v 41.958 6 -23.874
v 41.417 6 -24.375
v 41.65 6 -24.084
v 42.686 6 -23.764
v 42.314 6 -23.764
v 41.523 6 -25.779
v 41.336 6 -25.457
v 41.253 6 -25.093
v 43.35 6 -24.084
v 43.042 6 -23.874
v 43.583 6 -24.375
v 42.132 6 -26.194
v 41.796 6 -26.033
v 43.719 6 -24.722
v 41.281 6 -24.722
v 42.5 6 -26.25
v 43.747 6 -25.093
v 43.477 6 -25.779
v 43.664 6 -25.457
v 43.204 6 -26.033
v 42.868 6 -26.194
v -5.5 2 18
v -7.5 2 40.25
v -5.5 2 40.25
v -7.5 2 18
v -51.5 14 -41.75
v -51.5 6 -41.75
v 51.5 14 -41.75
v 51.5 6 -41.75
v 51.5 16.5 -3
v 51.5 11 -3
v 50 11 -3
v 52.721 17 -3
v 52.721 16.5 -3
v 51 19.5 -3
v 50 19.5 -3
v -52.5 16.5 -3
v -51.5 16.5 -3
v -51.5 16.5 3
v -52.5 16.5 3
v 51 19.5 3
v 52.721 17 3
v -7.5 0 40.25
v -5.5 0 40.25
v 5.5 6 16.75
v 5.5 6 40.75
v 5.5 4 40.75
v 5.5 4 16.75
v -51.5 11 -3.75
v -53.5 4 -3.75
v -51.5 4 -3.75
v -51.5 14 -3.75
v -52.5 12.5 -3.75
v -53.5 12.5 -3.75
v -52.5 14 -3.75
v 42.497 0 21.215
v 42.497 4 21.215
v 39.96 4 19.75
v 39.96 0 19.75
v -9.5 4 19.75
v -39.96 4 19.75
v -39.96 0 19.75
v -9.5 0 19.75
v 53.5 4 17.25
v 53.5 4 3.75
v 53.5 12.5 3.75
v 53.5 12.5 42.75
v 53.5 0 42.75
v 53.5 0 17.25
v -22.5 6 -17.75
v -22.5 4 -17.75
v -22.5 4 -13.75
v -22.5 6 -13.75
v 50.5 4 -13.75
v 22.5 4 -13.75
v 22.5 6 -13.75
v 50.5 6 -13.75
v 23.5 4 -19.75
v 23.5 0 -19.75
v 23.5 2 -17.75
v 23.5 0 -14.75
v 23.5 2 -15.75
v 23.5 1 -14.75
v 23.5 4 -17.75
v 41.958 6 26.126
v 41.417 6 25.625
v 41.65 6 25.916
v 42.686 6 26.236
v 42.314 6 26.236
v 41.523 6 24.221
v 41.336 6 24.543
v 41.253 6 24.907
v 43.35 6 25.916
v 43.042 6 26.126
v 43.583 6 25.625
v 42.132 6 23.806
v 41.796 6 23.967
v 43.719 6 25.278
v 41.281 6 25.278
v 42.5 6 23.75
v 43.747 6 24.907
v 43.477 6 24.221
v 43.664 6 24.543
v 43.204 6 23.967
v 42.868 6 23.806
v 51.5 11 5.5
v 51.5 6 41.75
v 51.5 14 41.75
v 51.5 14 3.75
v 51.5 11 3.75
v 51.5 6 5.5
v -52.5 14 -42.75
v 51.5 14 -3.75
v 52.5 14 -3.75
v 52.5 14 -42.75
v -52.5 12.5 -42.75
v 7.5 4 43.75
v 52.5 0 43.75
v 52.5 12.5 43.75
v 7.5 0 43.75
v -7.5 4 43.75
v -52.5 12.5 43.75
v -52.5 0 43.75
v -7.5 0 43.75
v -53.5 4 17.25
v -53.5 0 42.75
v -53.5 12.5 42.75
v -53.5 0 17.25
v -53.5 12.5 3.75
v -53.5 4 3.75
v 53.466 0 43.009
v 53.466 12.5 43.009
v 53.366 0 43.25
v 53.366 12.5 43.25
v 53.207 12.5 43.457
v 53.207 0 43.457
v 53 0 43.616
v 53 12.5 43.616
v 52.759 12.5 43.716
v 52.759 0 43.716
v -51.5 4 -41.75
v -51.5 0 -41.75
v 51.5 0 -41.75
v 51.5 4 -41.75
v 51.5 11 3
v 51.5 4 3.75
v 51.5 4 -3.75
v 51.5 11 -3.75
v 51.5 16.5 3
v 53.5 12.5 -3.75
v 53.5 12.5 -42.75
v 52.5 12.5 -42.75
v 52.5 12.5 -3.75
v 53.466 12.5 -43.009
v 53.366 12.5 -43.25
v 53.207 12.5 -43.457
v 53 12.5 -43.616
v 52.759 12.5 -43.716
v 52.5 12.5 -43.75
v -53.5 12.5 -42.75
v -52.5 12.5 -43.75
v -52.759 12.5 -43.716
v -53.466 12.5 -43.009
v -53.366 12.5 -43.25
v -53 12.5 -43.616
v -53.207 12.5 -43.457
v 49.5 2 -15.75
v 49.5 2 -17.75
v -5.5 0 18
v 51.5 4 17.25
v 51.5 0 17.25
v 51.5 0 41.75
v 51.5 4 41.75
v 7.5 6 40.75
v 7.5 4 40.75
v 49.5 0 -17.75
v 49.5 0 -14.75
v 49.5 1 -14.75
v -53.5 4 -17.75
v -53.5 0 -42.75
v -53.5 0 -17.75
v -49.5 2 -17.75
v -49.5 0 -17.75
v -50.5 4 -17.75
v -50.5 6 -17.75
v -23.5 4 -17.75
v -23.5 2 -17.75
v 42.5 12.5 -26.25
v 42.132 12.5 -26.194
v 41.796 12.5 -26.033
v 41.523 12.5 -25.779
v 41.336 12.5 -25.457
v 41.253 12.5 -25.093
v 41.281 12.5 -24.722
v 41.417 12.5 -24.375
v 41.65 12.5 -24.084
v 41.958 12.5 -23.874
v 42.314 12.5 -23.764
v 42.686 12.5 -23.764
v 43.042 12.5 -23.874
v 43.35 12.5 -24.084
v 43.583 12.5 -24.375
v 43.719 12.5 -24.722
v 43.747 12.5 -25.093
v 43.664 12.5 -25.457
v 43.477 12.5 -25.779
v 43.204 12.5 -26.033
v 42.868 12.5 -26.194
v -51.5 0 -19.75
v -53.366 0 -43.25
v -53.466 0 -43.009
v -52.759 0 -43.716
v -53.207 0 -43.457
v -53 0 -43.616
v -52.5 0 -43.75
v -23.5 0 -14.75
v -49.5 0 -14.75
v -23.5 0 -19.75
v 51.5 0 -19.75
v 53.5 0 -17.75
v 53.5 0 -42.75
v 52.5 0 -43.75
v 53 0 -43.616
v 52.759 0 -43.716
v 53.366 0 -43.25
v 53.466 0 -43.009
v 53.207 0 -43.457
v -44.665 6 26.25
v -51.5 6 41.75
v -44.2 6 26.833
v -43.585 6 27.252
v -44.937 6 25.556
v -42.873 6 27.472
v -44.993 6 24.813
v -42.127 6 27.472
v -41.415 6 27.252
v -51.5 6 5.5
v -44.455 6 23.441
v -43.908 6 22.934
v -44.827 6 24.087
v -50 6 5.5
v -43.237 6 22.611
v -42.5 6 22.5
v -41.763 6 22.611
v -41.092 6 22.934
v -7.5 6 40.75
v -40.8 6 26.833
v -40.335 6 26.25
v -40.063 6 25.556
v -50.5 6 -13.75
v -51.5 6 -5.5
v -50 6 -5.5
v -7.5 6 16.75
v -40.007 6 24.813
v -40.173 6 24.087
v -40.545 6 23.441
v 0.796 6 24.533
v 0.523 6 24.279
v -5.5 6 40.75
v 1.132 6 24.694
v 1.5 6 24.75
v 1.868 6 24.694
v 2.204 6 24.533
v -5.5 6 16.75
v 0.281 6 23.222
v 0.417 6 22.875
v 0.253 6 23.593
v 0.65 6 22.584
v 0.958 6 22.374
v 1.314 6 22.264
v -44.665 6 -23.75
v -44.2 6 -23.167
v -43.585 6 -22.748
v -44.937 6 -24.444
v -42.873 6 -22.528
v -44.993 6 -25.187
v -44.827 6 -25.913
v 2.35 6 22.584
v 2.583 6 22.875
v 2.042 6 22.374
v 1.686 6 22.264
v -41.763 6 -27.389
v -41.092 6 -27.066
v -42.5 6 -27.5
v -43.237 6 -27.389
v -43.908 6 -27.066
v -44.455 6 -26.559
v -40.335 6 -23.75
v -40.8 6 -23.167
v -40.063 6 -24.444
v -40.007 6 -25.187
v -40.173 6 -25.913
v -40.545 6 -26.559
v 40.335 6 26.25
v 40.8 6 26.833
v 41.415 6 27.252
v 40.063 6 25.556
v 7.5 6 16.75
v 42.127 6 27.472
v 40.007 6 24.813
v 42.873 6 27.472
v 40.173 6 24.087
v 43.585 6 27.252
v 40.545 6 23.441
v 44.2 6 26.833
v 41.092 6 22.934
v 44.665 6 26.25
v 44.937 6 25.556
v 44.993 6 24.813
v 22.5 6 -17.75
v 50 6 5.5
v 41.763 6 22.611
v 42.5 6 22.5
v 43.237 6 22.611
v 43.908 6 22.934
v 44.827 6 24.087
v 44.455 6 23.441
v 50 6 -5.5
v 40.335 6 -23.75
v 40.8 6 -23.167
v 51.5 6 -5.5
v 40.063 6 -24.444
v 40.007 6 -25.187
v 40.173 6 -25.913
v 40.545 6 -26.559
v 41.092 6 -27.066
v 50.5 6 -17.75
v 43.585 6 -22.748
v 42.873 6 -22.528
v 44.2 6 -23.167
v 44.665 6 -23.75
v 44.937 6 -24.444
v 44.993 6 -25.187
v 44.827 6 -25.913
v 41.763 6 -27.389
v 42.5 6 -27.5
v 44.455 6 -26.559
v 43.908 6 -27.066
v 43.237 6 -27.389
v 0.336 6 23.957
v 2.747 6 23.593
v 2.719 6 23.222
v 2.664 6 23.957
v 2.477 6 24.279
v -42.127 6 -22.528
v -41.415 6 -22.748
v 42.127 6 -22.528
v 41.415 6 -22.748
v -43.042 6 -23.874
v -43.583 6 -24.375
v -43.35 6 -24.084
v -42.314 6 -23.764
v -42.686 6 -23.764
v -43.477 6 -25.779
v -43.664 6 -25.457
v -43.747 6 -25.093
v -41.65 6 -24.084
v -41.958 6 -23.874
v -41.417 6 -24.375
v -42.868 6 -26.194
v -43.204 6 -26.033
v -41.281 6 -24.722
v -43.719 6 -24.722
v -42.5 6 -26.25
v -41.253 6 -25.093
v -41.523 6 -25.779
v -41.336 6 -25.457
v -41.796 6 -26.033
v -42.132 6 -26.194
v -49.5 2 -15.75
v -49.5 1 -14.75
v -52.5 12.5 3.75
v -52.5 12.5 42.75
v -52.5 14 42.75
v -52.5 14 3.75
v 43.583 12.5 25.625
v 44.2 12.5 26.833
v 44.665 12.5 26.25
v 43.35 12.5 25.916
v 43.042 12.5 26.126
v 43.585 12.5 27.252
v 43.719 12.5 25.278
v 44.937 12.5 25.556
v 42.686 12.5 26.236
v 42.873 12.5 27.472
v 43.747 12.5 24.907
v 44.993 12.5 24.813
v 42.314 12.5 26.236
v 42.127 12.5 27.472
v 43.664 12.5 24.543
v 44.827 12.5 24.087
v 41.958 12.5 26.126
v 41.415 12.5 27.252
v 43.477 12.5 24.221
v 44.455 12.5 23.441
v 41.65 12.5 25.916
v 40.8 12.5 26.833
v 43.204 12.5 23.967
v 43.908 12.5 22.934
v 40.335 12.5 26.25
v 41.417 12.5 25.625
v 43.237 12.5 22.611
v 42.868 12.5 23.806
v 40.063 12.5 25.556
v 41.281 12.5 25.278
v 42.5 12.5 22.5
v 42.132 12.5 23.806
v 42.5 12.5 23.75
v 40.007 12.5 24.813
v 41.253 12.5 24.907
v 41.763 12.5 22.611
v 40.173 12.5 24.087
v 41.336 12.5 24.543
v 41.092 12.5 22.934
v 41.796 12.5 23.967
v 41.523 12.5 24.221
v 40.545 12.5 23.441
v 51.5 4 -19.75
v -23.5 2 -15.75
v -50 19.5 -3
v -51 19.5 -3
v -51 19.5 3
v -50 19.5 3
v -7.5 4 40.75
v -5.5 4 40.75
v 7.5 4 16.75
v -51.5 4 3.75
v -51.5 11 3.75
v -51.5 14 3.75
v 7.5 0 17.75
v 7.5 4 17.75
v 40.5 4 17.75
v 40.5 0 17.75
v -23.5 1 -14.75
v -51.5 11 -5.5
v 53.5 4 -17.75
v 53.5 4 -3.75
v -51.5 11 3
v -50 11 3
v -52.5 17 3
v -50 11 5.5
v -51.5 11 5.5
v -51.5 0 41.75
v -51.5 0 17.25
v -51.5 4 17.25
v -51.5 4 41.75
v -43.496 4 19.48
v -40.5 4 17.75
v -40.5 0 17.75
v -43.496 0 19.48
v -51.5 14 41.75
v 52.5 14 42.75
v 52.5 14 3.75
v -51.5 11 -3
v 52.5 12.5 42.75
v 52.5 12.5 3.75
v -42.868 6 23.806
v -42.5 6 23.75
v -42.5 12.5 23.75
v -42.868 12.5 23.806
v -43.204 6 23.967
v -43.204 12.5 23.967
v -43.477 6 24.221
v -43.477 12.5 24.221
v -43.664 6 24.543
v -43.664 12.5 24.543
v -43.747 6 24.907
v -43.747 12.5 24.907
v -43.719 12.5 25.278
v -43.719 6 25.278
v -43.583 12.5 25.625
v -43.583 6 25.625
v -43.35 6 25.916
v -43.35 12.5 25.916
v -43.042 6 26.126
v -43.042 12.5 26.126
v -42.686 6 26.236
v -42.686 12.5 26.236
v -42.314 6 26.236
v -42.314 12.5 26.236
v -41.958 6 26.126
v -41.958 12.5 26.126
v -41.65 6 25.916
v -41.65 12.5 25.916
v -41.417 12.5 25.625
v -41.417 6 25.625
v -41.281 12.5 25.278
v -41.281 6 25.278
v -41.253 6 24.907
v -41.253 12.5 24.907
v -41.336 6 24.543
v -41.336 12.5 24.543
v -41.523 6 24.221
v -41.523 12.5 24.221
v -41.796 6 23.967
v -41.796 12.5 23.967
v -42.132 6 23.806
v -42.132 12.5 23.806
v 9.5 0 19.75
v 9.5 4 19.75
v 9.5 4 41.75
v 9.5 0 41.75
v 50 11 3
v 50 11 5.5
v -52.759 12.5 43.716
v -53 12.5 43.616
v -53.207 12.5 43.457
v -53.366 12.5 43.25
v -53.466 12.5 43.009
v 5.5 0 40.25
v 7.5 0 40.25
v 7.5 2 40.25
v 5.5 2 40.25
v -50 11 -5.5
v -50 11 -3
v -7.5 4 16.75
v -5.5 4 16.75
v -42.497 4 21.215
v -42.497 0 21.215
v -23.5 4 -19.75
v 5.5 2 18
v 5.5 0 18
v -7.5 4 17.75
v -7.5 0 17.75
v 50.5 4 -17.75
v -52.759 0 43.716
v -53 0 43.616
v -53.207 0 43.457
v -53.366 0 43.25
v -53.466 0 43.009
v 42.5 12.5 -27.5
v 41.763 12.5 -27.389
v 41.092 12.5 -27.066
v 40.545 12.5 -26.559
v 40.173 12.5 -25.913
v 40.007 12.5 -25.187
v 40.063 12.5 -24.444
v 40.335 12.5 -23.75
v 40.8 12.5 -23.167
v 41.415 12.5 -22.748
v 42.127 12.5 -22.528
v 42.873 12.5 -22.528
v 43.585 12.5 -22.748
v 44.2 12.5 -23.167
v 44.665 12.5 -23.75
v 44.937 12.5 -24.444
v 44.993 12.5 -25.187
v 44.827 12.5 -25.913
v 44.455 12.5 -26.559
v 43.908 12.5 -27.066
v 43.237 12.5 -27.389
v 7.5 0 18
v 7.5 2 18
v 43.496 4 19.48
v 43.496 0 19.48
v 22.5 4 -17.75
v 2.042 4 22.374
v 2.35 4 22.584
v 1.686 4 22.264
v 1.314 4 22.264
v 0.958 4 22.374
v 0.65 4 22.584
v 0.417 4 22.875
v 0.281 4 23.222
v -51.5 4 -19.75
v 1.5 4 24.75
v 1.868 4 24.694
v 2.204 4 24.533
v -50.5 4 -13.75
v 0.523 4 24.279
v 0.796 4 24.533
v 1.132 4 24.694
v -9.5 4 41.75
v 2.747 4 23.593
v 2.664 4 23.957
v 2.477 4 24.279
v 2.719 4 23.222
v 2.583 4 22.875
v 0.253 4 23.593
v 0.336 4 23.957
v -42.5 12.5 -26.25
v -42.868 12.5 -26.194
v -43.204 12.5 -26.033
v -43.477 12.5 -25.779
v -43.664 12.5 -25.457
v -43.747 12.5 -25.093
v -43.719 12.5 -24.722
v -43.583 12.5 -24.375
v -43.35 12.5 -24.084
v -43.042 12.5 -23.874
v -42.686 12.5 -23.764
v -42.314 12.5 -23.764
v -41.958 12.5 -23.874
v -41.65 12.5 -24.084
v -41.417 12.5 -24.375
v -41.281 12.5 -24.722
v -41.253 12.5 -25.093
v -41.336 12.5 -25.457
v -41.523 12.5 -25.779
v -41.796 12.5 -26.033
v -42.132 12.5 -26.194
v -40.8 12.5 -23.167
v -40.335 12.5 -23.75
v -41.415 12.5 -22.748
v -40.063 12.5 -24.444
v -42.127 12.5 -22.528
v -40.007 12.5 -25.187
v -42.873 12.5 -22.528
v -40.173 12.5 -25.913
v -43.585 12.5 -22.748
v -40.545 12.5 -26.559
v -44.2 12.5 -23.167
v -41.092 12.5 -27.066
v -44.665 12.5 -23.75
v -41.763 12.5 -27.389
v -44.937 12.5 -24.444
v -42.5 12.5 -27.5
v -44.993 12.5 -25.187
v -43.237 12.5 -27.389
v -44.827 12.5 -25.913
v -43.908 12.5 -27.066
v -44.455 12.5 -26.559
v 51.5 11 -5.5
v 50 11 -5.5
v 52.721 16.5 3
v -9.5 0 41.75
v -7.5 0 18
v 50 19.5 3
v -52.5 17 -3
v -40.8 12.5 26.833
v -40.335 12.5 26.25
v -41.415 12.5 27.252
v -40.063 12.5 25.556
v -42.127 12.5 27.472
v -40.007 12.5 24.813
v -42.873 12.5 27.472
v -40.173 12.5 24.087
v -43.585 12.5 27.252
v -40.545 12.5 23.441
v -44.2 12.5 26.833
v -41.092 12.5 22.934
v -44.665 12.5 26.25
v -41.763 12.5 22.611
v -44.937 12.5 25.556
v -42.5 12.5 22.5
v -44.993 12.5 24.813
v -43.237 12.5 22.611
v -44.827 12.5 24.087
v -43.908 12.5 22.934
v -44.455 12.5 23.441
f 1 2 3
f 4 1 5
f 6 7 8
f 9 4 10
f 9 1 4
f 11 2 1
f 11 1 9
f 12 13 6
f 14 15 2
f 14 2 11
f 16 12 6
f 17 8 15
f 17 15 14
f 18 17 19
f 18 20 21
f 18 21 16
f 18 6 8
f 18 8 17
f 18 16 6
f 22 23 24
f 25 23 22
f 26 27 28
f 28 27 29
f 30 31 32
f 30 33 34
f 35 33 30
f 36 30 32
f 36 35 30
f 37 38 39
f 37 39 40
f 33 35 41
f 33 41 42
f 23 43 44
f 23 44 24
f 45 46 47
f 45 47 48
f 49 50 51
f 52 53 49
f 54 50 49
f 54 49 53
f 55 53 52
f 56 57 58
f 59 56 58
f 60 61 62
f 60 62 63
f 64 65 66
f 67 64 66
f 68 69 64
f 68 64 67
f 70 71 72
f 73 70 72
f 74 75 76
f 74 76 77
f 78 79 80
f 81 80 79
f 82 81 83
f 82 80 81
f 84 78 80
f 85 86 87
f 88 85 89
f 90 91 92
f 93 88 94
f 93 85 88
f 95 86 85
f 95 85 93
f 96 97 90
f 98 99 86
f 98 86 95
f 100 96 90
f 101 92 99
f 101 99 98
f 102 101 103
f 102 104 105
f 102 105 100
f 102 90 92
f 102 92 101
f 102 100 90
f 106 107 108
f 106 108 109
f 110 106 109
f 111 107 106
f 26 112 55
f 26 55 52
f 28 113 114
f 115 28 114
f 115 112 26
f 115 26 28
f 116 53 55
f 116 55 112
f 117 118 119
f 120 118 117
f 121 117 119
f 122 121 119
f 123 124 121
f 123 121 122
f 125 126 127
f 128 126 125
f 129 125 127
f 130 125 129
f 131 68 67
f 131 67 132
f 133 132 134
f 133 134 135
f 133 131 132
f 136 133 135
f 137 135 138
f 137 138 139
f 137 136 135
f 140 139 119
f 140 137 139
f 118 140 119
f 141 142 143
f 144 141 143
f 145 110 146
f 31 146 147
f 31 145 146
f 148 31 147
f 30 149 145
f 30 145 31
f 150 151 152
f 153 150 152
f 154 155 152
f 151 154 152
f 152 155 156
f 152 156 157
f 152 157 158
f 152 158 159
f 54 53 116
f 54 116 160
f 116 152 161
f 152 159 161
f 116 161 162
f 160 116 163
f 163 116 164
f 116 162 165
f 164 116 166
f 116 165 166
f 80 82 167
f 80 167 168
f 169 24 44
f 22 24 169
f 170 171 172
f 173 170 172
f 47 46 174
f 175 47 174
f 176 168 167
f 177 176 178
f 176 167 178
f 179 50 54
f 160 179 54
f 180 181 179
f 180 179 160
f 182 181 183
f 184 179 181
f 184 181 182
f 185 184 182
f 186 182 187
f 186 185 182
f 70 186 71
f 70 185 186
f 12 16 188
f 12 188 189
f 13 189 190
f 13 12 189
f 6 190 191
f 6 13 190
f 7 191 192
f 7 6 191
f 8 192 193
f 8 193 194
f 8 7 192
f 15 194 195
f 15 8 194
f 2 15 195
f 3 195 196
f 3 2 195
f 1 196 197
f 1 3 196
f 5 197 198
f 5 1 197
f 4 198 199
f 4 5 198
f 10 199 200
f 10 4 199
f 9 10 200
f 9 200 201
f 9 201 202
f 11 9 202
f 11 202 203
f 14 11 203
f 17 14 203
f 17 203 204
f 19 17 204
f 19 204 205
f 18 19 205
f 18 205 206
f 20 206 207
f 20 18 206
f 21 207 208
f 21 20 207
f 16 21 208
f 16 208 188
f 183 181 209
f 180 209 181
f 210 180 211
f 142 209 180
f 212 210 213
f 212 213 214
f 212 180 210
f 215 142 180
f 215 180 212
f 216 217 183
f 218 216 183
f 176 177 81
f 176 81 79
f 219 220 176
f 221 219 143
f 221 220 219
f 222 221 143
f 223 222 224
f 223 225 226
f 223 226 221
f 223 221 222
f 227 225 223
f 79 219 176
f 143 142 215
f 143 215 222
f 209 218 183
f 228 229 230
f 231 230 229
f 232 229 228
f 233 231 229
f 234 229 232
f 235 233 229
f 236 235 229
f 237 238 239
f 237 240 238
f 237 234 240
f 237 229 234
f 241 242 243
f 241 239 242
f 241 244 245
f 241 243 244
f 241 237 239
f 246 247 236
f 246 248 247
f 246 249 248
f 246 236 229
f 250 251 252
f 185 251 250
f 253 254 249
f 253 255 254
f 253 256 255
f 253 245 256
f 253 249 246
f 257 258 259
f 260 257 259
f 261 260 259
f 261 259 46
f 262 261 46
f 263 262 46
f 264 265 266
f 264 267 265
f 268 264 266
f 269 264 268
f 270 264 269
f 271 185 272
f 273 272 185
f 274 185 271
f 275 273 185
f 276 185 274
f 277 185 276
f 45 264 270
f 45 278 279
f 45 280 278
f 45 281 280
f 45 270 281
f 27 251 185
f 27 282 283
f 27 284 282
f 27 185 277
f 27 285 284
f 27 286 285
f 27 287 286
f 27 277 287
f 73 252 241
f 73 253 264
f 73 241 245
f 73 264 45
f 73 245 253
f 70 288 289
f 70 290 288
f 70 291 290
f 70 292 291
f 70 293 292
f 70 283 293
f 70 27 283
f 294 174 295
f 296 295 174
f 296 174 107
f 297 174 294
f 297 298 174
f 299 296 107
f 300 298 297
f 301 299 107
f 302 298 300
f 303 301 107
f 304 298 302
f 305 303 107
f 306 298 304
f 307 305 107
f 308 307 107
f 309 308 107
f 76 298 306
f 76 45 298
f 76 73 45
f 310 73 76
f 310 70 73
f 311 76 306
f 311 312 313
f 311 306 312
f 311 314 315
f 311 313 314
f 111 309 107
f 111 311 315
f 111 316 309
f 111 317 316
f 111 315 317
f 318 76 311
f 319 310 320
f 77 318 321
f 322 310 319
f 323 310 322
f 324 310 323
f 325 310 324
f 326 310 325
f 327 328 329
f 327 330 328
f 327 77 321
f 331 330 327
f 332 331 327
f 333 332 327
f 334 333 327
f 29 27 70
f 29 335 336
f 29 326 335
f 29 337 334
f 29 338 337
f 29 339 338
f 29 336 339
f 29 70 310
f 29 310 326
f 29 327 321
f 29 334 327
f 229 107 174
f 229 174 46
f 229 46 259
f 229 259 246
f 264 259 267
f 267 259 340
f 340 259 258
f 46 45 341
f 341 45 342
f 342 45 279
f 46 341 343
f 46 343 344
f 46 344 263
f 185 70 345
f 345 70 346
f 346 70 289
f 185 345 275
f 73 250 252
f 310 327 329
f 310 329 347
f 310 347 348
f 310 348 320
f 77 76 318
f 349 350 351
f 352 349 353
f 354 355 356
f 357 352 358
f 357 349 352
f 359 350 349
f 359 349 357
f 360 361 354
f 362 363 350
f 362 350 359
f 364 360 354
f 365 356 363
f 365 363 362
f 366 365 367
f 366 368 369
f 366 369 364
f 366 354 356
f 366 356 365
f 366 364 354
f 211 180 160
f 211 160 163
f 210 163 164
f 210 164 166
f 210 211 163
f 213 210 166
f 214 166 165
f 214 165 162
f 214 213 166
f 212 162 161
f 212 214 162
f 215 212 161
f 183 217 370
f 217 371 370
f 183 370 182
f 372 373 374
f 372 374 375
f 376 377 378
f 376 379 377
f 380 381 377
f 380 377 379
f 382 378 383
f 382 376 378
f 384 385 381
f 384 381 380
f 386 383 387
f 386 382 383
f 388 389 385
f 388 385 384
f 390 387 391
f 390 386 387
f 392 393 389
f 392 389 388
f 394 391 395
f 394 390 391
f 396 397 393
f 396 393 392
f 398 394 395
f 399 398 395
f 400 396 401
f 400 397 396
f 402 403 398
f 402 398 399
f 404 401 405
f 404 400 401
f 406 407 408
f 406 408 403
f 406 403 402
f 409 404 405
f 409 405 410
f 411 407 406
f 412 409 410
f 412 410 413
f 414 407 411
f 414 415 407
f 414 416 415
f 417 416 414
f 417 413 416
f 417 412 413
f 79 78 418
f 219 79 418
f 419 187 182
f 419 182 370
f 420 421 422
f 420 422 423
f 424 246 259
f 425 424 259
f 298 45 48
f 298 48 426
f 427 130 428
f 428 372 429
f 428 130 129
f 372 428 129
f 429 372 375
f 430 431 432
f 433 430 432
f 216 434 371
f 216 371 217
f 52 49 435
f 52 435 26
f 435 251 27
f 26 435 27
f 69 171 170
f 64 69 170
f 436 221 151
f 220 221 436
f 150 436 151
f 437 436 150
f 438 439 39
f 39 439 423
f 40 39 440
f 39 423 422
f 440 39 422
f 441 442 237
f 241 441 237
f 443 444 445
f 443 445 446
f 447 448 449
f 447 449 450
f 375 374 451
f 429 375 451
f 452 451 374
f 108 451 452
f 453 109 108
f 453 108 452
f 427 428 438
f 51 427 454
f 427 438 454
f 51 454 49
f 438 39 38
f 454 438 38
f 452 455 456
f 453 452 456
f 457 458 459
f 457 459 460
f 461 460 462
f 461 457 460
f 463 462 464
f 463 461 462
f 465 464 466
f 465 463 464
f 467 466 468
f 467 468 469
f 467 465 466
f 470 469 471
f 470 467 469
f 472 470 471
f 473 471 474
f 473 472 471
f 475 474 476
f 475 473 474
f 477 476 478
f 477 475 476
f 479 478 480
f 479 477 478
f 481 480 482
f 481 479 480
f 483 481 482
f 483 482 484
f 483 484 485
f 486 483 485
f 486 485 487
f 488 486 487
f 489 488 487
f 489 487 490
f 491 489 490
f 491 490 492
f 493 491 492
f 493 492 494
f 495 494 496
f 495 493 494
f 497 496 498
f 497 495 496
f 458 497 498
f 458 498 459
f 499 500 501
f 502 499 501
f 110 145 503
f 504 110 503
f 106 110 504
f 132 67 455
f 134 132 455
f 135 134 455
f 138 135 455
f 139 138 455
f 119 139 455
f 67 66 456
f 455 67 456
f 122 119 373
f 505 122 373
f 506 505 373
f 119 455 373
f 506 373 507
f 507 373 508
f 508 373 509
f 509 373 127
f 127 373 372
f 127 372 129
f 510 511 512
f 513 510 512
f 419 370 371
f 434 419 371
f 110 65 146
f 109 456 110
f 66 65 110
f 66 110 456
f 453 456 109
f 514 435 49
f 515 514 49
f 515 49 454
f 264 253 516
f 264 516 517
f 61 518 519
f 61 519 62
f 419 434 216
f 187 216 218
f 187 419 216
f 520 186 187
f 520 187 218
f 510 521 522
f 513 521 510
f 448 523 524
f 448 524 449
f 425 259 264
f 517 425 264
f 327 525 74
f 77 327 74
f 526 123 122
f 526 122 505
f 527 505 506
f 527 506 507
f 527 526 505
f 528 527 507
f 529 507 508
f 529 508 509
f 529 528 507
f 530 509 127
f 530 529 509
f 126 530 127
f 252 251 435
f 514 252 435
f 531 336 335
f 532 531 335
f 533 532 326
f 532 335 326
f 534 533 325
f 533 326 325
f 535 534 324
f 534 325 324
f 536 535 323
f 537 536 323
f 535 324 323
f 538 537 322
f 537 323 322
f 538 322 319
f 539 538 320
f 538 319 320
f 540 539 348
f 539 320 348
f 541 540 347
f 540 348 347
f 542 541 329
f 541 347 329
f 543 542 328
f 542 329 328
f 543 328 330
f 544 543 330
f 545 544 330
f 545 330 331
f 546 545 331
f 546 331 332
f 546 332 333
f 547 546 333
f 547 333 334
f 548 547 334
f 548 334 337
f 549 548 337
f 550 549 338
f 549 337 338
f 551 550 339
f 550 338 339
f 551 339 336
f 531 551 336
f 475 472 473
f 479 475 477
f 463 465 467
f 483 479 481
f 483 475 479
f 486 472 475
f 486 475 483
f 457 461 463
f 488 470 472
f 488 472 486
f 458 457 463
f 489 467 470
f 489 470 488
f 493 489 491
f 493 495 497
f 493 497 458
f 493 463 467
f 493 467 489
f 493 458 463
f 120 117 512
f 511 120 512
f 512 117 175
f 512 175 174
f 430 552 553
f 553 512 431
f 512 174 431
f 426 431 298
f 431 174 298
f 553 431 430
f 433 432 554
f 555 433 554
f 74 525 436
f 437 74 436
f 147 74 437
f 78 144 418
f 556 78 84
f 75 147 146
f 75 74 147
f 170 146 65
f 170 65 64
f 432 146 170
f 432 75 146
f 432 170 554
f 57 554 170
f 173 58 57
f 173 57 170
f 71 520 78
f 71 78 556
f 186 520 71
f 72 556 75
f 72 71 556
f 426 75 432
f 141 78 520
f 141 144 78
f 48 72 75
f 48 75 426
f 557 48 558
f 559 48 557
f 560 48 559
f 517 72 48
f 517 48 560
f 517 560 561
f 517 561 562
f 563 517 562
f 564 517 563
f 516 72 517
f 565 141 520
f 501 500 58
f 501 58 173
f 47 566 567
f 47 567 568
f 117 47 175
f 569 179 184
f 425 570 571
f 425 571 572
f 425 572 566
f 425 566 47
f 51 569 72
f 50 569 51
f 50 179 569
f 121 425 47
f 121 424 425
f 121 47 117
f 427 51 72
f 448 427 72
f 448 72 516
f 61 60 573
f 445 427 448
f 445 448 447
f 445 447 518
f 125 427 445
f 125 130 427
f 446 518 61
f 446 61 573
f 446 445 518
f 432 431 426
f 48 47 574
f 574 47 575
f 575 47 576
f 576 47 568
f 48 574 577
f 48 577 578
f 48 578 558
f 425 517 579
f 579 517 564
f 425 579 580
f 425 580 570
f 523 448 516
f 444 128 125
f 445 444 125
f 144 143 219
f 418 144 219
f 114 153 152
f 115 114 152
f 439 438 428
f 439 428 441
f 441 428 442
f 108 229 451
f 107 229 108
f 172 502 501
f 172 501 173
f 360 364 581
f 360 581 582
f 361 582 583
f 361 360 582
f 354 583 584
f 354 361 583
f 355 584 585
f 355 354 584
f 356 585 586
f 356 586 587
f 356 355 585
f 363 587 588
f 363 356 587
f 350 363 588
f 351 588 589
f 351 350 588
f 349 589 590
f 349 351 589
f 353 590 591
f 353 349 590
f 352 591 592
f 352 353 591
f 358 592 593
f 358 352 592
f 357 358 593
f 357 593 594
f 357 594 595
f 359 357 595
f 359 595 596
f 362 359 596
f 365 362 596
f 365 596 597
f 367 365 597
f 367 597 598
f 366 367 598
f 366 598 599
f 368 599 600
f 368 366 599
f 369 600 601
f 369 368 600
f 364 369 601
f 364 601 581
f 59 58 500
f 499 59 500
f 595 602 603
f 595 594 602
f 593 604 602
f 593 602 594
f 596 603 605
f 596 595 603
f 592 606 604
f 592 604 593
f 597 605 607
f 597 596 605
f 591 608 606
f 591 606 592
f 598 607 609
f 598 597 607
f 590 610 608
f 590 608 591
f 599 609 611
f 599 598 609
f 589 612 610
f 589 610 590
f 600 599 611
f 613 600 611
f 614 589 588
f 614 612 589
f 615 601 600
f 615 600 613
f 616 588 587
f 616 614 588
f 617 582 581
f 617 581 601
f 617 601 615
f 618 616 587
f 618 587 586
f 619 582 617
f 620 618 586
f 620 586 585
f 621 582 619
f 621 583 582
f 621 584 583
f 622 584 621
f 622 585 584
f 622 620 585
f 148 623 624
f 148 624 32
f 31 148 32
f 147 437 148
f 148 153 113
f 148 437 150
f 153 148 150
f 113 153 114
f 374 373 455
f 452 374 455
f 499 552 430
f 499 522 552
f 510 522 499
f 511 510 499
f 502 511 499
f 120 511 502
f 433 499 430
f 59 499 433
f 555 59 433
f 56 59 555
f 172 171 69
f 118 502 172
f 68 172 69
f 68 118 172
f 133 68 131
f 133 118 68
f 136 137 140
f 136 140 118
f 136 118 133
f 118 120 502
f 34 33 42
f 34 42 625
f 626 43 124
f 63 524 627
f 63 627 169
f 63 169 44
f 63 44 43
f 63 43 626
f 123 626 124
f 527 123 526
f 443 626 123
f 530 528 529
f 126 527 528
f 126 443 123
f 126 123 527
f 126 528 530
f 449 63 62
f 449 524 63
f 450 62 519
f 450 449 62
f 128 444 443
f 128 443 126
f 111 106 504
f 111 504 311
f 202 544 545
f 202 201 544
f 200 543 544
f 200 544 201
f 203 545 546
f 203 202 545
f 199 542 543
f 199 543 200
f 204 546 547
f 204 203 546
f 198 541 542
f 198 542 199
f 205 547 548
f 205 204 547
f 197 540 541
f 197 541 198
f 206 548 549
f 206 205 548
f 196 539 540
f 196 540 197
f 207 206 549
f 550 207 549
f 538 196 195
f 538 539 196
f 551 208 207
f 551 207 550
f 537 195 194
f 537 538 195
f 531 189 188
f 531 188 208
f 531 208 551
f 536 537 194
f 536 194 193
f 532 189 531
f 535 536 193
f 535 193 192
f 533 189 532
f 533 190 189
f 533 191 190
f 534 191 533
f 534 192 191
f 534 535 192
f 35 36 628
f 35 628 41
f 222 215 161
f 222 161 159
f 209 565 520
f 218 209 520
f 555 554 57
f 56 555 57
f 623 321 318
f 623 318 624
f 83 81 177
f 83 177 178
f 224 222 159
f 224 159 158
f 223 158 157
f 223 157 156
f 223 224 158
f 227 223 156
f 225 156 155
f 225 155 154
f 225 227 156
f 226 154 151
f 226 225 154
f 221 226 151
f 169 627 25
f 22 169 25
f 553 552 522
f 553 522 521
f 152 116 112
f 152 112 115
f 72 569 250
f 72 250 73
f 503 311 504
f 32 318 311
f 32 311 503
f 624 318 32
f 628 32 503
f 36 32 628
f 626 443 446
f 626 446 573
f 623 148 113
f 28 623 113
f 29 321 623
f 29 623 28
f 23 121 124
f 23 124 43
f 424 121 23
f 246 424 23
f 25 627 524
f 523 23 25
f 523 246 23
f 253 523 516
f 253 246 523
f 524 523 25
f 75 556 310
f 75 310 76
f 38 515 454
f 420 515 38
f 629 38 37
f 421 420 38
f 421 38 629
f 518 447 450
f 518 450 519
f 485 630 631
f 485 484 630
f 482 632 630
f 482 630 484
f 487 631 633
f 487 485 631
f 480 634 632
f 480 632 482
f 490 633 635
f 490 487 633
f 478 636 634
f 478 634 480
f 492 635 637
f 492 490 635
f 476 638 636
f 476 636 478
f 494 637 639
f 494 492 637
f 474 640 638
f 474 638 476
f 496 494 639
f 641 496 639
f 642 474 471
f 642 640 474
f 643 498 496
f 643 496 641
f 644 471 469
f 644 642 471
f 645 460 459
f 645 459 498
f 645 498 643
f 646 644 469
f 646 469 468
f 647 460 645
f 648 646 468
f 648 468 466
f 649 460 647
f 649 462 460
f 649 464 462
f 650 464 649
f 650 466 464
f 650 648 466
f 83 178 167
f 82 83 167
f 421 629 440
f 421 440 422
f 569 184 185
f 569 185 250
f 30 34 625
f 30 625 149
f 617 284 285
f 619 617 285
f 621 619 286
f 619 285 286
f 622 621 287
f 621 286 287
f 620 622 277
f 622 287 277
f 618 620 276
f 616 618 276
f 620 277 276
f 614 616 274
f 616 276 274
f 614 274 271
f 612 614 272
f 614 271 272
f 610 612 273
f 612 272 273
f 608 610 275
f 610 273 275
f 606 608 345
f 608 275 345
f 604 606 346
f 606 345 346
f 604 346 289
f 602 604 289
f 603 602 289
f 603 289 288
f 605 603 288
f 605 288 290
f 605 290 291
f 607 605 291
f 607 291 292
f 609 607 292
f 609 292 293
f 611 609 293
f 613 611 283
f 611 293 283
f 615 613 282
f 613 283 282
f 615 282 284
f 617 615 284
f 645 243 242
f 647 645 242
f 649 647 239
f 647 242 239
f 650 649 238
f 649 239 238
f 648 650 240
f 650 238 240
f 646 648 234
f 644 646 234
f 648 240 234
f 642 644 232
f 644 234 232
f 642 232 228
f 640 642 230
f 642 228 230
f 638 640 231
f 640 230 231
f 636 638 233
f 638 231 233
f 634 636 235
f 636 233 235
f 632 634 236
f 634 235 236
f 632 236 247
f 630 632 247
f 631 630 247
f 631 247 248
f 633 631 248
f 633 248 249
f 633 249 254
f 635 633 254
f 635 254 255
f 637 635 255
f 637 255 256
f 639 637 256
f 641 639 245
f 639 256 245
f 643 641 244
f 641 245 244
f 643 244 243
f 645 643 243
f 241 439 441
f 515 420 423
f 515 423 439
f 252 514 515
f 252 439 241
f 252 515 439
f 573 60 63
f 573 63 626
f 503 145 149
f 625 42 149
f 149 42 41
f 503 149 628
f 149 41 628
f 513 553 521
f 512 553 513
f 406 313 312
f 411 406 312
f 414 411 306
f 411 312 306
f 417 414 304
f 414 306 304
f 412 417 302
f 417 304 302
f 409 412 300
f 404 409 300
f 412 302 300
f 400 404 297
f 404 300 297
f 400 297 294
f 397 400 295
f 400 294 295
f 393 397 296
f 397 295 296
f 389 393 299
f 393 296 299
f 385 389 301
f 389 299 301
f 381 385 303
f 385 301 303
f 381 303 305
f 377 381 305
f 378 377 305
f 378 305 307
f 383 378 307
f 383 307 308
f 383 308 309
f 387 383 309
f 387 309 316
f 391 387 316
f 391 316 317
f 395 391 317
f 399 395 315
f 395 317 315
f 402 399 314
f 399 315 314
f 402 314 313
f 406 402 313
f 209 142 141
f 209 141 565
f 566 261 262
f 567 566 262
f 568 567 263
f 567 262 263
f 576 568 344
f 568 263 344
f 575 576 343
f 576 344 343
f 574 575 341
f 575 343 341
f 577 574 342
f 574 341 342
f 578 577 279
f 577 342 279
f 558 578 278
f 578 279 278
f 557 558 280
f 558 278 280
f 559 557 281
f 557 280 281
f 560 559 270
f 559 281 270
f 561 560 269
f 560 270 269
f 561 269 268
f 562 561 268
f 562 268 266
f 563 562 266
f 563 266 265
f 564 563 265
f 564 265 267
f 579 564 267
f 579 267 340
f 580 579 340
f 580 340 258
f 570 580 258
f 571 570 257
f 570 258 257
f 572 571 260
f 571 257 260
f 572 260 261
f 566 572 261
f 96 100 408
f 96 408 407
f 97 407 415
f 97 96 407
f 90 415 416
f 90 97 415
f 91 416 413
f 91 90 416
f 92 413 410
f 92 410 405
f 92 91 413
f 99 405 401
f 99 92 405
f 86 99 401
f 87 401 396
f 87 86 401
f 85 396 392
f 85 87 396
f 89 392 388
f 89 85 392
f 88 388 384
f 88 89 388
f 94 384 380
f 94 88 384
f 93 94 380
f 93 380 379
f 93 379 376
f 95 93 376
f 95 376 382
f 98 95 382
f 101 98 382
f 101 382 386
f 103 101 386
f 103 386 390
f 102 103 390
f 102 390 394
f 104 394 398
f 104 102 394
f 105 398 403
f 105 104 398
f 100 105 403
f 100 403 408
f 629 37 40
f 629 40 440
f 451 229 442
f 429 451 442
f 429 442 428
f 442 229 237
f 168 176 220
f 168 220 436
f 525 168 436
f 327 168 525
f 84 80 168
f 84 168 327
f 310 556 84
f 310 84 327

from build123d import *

# Parameters (mm, degrees)
BOSS_EXTRUDE1_DEPTH  = 12.5
SKETCH2_W            = 103
SKETCH2_H            = 83.5
CUT_EXTRUDE1_DEPTH   = 4
SKETCH3_W            = 103
SKETCH3_H            = 83.5
CUT_EXTRUDE2_DEPTH   = 6.5
SKETCH4_W            = 105
SKETCH4_H            = 85.5
SKETCH4_W_2          = 103
SKETCH4_H_2          = 83.5
BOSS_EXTRUDE2_DEPTH  = 1.5
SKETCH7_W            = 35
SKETCH7_H            = 4
CUT_EXTRUDE3_DEPTH   = 117.443387532
SKETCH8_W            = 7.5
SKETCH8_H            = 10
CUT_EXTRUDE4_DEPTH   = 2
SKETCH9_W            = 7.5
SKETCH9_H            = 10
CUT_EXTRUDE5_DEPTH   = 2
BOSS_EXTRUDE3_DEPTH  = 1.5
BOSS_EXTRUDE4_DEPTH  = 1.5
BOSS_EXTRUDE5_DEPTH  = 6
BOSS_EXTRUDE6_DEPTH  = 6
SKETCH14_W           = 28
SKETCH14_H           = 4
CUT_EXTRUDE6_DEPTH   = 2
SKETCH15_W           = 15
SKETCH15_H           = 3.5
CUT_EXTRUDE7_DEPTH   = 4
SKETCH16_R           = 1.25
SKETCH16_W           = 2
SKETCH16_H           = 24
CUT_EXTRUDE8_DEPTH   = 2
SKETCH17_R           = 2.5
SKETCH17_R_2         = 1.25
BOSS_EXTRUDE7_DEPTH  = 6.5
SKETCH18_W           = 28
SKETCH18_H           = 2
BOSS_EXTRUDE8_DEPTH  = 4
BOSS_EXTRUDE9_DEPTH  = 26
BOSS_EXTRUDE10_DEPTH = 26
BOSS_EXTRUDE11_DEPTH = 4
SKETCH22_W           = 22.25
SKETCH22_H           = 2
BOSS_EXTRUDE12_DEPTH = 2
SKETCH23_W           = 22.25
SKETCH23_H           = 2
BOSS_EXTRUDE13_DEPTH = 2


with BuildPart() as part:
    # Sketch1 → Boss-Extrude1 (new body)
    with BuildSketch(Plane(origin=(0, 0, 0), x_dir=(1, 0, 0), z_dir=(0, 1, 0))):
        with BuildLine():
            Line((52.5, -43.75), (-52.5, -43.75))
            ThreePointArc((-52.5, -43.75), (-53.207106781, -43.457106781), (-53.5, -42.75))
            Line((-53.5, -42.75), (-53.5, 42.75))
            ThreePointArc((-53.5, 42.75), (-53.207106781, 43.457106781), (-52.5, 43.75))
            Line((-52.5, 43.75), (52.5, 43.75))
            ThreePointArc((52.5, 43.75), (53.207106781, 43.457106781), (53.5, 42.75))
            Line((53.5, 42.75), (53.5, -42.75))
            ThreePointArc((53.5, -42.75), (53.207106781, -43.457106781), (52.5, -43.75))
        make_face()
    extrude(amount=BOSS_EXTRUDE1_DEPTH)

    # Sketch2 → Cut-Extrude1 (cut)
    with BuildSketch(Plane.XZ):
        Rectangle(SKETCH2_W, SKETCH2_H)
    extrude(amount=-CUT_EXTRUDE1_DEPTH, mode=Mode.SUBTRACT)

    # Sketch3 → Cut-Extrude2 (cut)
    with BuildSketch(Plane(origin=(0, 12.5, 0), x_dir=(1, 0, 0), z_dir=(0, 1, 0))):
        Rectangle(SKETCH3_W, SKETCH3_H)
    extrude(amount=-CUT_EXTRUDE2_DEPTH, mode=Mode.SUBTRACT)

    # Sketch4 → Boss-Extrude2 (add)
    with BuildSketch(Plane(origin=(0, 12.5, 0), x_dir=(1, 0, 0), z_dir=(0, 1, 0))):
        Rectangle(SKETCH4_W, SKETCH4_H)
        Rectangle(SKETCH4_W_2, SKETCH4_H_2, mode=Mode.SUBTRACT)
    extrude(amount=BOSS_EXTRUDE2_DEPTH)

    # Sketch7 → Cut-Extrude3 (cut, through all)
    with BuildSketch(Plane.ZY.offset(53.5)):
        with Locations((-0.25, 2)):
            Rectangle(SKETCH7_W, SKETCH7_H)
    extrude(amount=-CUT_EXTRUDE3_DEPTH, mode=Mode.SUBTRACT)

    # Sketch8 → Cut-Extrude4 (cut)
    with BuildSketch(Plane.ZY.offset(53.5)):
        with Locations((0, 9)):
            Rectangle(SKETCH8_W, SKETCH8_H)
    extrude(amount=-CUT_EXTRUDE4_DEPTH, mode=Mode.SUBTRACT)

    # Sketch9 → Cut-Extrude5 (cut)
    with BuildSketch(Plane(origin=(53.5, 0, 0), x_dir=(0, 0, -1), z_dir=(1, 0, 0))):
        with Locations((0, 9)):
            Rectangle(SKETCH9_W, SKETCH9_H)
    extrude(amount=-CUT_EXTRUDE5_DEPTH, mode=Mode.SUBTRACT)

    # Sketch10 → Boss-Extrude3 (add)
    with BuildSketch(Plane.ZY.offset(-51.5)):
        Polygon((5.5, 6), (-5.5, 6), (-5.5, 11), (-3, 11), (-3, 16.5), (3, 16.5), (3, 11), (5.5, 11), align=None)
    extrude(amount=BOSS_EXTRUDE3_DEPTH)

    # Sketch11 → Boss-Extrude4 (add)
    with BuildSketch(Plane(origin=(-51.5, 0, 0), x_dir=(0, 0, -1), z_dir=(1, 0, 0))):
        Polygon((-5.5, 11), (-5.5, 6), (5.5, 6), (5.5, 11), (3, 11), (3, 16.5), (-3, 16.5), (-3, 11), align=None)
    extrude(amount=BOSS_EXTRUDE4_DEPTH)

    # Sketch12 → Boss-Extrude5 (add)
    with BuildSketch(Plane(origin=(0, 0, -3), x_dir=(-1, 0, 0), z_dir=(0, 0, -1))):
        Polygon((-52.720588235, 16.5), (-50, 16.5), (-50, 19.5), (-51, 19.5), (-52.720588235, 17), align=None)
    extrude(amount=-BOSS_EXTRUDE5_DEPTH)

    # Sketch13 → Boss-Extrude6 (add)
    with BuildSketch(Plane(origin=(0, 0, -3), x_dir=(-1, 0, 0), z_dir=(0, 0, -1))):
        Polygon((50, 16.5), (52.5, 16.5), (52.5, 17), (51, 19.5), (50, 19.5), align=None)
    extrude(amount=-BOSS_EXTRUDE6_DEPTH)

    # Sketch14 → Cut-Extrude6 (cut)
    with BuildSketch(Plane.XZ.offset(-4)):
        with Locations((36.5, -15.75)):
            Rectangle(SKETCH14_W, SKETCH14_H)
        with Locations((-36.5, -15.75)):
            Rectangle(SKETCH14_W, SKETCH14_H)
    extrude(amount=-CUT_EXTRUDE6_DEPTH, mode=Mode.SUBTRACT)

    # Sketch15 → Cut-Extrude7 (cut)
    with BuildSketch(Plane.XZ):
        with Locations((0, 42)):
            Rectangle(SKETCH15_W, SKETCH15_H)
    extrude(amount=-CUT_EXTRUDE7_DEPTH, mode=Mode.SUBTRACT)

    # Sketch16 → Cut-Extrude8 (cut)
    with BuildSketch(Plane(origin=(0, 6, 0), x_dir=(1, 0, 0), z_dir=(0, 1, 0))):
        with Locations(Location((1.5, -23.5, 0), (0, 0, 270))):
            Circle(SKETCH16_R)
        with Locations((6.5, -28.75)):
            Rectangle(SKETCH16_W, SKETCH16_H)
        with Locations((-6.5, -28.75)):
            Rectangle(SKETCH16_W, SKETCH16_H)
    extrude(amount=-CUT_EXTRUDE8_DEPTH, mode=Mode.SUBTRACT)

    # Sketch17 → Boss-Extrude7 (add)
    # profile 1 of 4: a face of its own
    with BuildSketch(Plane(origin=(0, 6, 0), x_dir=(1, 0, 0), z_dir=(0, 1, 0))):
        with Locations(Location((42.5, 25, 0), (0, 0, 90))):
            Circle(SKETCH17_R)
        with Locations(Location((42.5, 25, 0), (0, 0, 90))):
            Circle(SKETCH17_R_2, mode=Mode.SUBTRACT)
    # profile 2 of 4: a face of its own
    with BuildSketch(Plane(origin=(0, 6, 0), x_dir=(1, 0, 0), z_dir=(0, 1, 0))):
        with Locations(Location((42.5, -25, 0), (0, 0, 90))):
            Circle(SKETCH17_R)
        with Locations(Location((42.5, -25, 0), (0, 0, 90))):
            Circle(SKETCH17_R_2, mode=Mode.SUBTRACT)
    # profile 3 of 4: a face of its own
    with BuildSketch(Plane(origin=(0, 6, 0), x_dir=(1, 0, 0), z_dir=(0, 1, 0))):
        with Locations(Location((-42.5, 25, 0), (0, 0, 90))):
            Circle(SKETCH17_R)
        with Locations(Location((-42.5, 25, 0), (0, 0, 90))):
            Circle(SKETCH17_R_2, mode=Mode.SUBTRACT)
    # profile 4 of 4: a face of its own
    with BuildSketch(Plane(origin=(0, 6, 0), x_dir=(1, 0, 0), z_dir=(0, 1, 0))):
        with Locations(Location((-42.5, -25, 0), (0, 0, 90))):
            Circle(SKETCH17_R)
        with Locations(Location((-42.5, -25, 0), (0, 0, 90))):
            Circle(SKETCH17_R_2, mode=Mode.SUBTRACT)
    extrude(amount=BOSS_EXTRUDE7_DEPTH)

    # Sketch18 → Boss-Extrude8 (add)
    with BuildSketch(Plane.XZ.offset(-4)):
        with Locations((-37.5, -18.75)):
            Rectangle(SKETCH18_W, SKETCH18_H)
        with Locations((37.5, -18.75)):
            Rectangle(SKETCH18_W, SKETCH18_H)
    extrude(amount=BOSS_EXTRUDE8_DEPTH)

    # Sketch19 → Boss-Extrude9 (add)
    with BuildSketch(Plane.ZY.offset(-23.5)):
        Polygon((-17.75, 0), (-14.75, 0), (-14.75, 1), (-15.75, 2), (-17.75, 2), align=None)
    extrude(amount=-BOSS_EXTRUDE9_DEPTH)

    # Sketch20 → Boss-Extrude10 (add)
    with BuildSketch(Plane(origin=(-23.5, 0, 0), x_dir=(0, 0, -1), z_dir=(1, 0, 0))):
        Polygon((14.75, 0), (17.75, 0), (17.75, 2), (15.75, 2), (14.75, 1), align=None)
    extrude(amount=-BOSS_EXTRUDE10_DEPTH)

    # Sketch21 → Boss-Extrude11 (add)
    with BuildSketch(Plane.XZ.offset(-4)):
        Polygon((7.5, 41.75), (7.5, 17.75), (40.5, 17.75), (43.496447897, 19.48), (42.497454433, 21.215), (39.96, 19.75), (9.5, 19.75), (9.5, 41.75), align=None)
        Polygon((-7.5, 41.75), (-7.5, 17.75), (-40.5, 17.75), (-43.496447897, 19.48), (-42.497454433, 21.215), (-39.96, 19.75), (-9.5, 19.75), (-9.5, 41.75), align=None)
    extrude(amount=BOSS_EXTRUDE11_DEPTH)

    # Sketch22 → Boss-Extrude12 (add)
    with BuildSketch(Plane.ZY.offset(-7.5)):
        with Locations((29.125, 1)):
            Rectangle(SKETCH22_W, SKETCH22_H)
    extrude(amount=BOSS_EXTRUDE12_DEPTH)

    # Sketch23 → Boss-Extrude13 (add)
    with BuildSketch(Plane(origin=(-7.5, 0, 0), x_dir=(0, 0, -1), z_dir=(1, 0, 0))):
        with Locations((-29.125, 1)):
            Rectangle(SKETCH23_W, SKETCH23_H)
    extrude(amount=BOSS_EXTRUDE13_DEPTH)


solid = part.part
